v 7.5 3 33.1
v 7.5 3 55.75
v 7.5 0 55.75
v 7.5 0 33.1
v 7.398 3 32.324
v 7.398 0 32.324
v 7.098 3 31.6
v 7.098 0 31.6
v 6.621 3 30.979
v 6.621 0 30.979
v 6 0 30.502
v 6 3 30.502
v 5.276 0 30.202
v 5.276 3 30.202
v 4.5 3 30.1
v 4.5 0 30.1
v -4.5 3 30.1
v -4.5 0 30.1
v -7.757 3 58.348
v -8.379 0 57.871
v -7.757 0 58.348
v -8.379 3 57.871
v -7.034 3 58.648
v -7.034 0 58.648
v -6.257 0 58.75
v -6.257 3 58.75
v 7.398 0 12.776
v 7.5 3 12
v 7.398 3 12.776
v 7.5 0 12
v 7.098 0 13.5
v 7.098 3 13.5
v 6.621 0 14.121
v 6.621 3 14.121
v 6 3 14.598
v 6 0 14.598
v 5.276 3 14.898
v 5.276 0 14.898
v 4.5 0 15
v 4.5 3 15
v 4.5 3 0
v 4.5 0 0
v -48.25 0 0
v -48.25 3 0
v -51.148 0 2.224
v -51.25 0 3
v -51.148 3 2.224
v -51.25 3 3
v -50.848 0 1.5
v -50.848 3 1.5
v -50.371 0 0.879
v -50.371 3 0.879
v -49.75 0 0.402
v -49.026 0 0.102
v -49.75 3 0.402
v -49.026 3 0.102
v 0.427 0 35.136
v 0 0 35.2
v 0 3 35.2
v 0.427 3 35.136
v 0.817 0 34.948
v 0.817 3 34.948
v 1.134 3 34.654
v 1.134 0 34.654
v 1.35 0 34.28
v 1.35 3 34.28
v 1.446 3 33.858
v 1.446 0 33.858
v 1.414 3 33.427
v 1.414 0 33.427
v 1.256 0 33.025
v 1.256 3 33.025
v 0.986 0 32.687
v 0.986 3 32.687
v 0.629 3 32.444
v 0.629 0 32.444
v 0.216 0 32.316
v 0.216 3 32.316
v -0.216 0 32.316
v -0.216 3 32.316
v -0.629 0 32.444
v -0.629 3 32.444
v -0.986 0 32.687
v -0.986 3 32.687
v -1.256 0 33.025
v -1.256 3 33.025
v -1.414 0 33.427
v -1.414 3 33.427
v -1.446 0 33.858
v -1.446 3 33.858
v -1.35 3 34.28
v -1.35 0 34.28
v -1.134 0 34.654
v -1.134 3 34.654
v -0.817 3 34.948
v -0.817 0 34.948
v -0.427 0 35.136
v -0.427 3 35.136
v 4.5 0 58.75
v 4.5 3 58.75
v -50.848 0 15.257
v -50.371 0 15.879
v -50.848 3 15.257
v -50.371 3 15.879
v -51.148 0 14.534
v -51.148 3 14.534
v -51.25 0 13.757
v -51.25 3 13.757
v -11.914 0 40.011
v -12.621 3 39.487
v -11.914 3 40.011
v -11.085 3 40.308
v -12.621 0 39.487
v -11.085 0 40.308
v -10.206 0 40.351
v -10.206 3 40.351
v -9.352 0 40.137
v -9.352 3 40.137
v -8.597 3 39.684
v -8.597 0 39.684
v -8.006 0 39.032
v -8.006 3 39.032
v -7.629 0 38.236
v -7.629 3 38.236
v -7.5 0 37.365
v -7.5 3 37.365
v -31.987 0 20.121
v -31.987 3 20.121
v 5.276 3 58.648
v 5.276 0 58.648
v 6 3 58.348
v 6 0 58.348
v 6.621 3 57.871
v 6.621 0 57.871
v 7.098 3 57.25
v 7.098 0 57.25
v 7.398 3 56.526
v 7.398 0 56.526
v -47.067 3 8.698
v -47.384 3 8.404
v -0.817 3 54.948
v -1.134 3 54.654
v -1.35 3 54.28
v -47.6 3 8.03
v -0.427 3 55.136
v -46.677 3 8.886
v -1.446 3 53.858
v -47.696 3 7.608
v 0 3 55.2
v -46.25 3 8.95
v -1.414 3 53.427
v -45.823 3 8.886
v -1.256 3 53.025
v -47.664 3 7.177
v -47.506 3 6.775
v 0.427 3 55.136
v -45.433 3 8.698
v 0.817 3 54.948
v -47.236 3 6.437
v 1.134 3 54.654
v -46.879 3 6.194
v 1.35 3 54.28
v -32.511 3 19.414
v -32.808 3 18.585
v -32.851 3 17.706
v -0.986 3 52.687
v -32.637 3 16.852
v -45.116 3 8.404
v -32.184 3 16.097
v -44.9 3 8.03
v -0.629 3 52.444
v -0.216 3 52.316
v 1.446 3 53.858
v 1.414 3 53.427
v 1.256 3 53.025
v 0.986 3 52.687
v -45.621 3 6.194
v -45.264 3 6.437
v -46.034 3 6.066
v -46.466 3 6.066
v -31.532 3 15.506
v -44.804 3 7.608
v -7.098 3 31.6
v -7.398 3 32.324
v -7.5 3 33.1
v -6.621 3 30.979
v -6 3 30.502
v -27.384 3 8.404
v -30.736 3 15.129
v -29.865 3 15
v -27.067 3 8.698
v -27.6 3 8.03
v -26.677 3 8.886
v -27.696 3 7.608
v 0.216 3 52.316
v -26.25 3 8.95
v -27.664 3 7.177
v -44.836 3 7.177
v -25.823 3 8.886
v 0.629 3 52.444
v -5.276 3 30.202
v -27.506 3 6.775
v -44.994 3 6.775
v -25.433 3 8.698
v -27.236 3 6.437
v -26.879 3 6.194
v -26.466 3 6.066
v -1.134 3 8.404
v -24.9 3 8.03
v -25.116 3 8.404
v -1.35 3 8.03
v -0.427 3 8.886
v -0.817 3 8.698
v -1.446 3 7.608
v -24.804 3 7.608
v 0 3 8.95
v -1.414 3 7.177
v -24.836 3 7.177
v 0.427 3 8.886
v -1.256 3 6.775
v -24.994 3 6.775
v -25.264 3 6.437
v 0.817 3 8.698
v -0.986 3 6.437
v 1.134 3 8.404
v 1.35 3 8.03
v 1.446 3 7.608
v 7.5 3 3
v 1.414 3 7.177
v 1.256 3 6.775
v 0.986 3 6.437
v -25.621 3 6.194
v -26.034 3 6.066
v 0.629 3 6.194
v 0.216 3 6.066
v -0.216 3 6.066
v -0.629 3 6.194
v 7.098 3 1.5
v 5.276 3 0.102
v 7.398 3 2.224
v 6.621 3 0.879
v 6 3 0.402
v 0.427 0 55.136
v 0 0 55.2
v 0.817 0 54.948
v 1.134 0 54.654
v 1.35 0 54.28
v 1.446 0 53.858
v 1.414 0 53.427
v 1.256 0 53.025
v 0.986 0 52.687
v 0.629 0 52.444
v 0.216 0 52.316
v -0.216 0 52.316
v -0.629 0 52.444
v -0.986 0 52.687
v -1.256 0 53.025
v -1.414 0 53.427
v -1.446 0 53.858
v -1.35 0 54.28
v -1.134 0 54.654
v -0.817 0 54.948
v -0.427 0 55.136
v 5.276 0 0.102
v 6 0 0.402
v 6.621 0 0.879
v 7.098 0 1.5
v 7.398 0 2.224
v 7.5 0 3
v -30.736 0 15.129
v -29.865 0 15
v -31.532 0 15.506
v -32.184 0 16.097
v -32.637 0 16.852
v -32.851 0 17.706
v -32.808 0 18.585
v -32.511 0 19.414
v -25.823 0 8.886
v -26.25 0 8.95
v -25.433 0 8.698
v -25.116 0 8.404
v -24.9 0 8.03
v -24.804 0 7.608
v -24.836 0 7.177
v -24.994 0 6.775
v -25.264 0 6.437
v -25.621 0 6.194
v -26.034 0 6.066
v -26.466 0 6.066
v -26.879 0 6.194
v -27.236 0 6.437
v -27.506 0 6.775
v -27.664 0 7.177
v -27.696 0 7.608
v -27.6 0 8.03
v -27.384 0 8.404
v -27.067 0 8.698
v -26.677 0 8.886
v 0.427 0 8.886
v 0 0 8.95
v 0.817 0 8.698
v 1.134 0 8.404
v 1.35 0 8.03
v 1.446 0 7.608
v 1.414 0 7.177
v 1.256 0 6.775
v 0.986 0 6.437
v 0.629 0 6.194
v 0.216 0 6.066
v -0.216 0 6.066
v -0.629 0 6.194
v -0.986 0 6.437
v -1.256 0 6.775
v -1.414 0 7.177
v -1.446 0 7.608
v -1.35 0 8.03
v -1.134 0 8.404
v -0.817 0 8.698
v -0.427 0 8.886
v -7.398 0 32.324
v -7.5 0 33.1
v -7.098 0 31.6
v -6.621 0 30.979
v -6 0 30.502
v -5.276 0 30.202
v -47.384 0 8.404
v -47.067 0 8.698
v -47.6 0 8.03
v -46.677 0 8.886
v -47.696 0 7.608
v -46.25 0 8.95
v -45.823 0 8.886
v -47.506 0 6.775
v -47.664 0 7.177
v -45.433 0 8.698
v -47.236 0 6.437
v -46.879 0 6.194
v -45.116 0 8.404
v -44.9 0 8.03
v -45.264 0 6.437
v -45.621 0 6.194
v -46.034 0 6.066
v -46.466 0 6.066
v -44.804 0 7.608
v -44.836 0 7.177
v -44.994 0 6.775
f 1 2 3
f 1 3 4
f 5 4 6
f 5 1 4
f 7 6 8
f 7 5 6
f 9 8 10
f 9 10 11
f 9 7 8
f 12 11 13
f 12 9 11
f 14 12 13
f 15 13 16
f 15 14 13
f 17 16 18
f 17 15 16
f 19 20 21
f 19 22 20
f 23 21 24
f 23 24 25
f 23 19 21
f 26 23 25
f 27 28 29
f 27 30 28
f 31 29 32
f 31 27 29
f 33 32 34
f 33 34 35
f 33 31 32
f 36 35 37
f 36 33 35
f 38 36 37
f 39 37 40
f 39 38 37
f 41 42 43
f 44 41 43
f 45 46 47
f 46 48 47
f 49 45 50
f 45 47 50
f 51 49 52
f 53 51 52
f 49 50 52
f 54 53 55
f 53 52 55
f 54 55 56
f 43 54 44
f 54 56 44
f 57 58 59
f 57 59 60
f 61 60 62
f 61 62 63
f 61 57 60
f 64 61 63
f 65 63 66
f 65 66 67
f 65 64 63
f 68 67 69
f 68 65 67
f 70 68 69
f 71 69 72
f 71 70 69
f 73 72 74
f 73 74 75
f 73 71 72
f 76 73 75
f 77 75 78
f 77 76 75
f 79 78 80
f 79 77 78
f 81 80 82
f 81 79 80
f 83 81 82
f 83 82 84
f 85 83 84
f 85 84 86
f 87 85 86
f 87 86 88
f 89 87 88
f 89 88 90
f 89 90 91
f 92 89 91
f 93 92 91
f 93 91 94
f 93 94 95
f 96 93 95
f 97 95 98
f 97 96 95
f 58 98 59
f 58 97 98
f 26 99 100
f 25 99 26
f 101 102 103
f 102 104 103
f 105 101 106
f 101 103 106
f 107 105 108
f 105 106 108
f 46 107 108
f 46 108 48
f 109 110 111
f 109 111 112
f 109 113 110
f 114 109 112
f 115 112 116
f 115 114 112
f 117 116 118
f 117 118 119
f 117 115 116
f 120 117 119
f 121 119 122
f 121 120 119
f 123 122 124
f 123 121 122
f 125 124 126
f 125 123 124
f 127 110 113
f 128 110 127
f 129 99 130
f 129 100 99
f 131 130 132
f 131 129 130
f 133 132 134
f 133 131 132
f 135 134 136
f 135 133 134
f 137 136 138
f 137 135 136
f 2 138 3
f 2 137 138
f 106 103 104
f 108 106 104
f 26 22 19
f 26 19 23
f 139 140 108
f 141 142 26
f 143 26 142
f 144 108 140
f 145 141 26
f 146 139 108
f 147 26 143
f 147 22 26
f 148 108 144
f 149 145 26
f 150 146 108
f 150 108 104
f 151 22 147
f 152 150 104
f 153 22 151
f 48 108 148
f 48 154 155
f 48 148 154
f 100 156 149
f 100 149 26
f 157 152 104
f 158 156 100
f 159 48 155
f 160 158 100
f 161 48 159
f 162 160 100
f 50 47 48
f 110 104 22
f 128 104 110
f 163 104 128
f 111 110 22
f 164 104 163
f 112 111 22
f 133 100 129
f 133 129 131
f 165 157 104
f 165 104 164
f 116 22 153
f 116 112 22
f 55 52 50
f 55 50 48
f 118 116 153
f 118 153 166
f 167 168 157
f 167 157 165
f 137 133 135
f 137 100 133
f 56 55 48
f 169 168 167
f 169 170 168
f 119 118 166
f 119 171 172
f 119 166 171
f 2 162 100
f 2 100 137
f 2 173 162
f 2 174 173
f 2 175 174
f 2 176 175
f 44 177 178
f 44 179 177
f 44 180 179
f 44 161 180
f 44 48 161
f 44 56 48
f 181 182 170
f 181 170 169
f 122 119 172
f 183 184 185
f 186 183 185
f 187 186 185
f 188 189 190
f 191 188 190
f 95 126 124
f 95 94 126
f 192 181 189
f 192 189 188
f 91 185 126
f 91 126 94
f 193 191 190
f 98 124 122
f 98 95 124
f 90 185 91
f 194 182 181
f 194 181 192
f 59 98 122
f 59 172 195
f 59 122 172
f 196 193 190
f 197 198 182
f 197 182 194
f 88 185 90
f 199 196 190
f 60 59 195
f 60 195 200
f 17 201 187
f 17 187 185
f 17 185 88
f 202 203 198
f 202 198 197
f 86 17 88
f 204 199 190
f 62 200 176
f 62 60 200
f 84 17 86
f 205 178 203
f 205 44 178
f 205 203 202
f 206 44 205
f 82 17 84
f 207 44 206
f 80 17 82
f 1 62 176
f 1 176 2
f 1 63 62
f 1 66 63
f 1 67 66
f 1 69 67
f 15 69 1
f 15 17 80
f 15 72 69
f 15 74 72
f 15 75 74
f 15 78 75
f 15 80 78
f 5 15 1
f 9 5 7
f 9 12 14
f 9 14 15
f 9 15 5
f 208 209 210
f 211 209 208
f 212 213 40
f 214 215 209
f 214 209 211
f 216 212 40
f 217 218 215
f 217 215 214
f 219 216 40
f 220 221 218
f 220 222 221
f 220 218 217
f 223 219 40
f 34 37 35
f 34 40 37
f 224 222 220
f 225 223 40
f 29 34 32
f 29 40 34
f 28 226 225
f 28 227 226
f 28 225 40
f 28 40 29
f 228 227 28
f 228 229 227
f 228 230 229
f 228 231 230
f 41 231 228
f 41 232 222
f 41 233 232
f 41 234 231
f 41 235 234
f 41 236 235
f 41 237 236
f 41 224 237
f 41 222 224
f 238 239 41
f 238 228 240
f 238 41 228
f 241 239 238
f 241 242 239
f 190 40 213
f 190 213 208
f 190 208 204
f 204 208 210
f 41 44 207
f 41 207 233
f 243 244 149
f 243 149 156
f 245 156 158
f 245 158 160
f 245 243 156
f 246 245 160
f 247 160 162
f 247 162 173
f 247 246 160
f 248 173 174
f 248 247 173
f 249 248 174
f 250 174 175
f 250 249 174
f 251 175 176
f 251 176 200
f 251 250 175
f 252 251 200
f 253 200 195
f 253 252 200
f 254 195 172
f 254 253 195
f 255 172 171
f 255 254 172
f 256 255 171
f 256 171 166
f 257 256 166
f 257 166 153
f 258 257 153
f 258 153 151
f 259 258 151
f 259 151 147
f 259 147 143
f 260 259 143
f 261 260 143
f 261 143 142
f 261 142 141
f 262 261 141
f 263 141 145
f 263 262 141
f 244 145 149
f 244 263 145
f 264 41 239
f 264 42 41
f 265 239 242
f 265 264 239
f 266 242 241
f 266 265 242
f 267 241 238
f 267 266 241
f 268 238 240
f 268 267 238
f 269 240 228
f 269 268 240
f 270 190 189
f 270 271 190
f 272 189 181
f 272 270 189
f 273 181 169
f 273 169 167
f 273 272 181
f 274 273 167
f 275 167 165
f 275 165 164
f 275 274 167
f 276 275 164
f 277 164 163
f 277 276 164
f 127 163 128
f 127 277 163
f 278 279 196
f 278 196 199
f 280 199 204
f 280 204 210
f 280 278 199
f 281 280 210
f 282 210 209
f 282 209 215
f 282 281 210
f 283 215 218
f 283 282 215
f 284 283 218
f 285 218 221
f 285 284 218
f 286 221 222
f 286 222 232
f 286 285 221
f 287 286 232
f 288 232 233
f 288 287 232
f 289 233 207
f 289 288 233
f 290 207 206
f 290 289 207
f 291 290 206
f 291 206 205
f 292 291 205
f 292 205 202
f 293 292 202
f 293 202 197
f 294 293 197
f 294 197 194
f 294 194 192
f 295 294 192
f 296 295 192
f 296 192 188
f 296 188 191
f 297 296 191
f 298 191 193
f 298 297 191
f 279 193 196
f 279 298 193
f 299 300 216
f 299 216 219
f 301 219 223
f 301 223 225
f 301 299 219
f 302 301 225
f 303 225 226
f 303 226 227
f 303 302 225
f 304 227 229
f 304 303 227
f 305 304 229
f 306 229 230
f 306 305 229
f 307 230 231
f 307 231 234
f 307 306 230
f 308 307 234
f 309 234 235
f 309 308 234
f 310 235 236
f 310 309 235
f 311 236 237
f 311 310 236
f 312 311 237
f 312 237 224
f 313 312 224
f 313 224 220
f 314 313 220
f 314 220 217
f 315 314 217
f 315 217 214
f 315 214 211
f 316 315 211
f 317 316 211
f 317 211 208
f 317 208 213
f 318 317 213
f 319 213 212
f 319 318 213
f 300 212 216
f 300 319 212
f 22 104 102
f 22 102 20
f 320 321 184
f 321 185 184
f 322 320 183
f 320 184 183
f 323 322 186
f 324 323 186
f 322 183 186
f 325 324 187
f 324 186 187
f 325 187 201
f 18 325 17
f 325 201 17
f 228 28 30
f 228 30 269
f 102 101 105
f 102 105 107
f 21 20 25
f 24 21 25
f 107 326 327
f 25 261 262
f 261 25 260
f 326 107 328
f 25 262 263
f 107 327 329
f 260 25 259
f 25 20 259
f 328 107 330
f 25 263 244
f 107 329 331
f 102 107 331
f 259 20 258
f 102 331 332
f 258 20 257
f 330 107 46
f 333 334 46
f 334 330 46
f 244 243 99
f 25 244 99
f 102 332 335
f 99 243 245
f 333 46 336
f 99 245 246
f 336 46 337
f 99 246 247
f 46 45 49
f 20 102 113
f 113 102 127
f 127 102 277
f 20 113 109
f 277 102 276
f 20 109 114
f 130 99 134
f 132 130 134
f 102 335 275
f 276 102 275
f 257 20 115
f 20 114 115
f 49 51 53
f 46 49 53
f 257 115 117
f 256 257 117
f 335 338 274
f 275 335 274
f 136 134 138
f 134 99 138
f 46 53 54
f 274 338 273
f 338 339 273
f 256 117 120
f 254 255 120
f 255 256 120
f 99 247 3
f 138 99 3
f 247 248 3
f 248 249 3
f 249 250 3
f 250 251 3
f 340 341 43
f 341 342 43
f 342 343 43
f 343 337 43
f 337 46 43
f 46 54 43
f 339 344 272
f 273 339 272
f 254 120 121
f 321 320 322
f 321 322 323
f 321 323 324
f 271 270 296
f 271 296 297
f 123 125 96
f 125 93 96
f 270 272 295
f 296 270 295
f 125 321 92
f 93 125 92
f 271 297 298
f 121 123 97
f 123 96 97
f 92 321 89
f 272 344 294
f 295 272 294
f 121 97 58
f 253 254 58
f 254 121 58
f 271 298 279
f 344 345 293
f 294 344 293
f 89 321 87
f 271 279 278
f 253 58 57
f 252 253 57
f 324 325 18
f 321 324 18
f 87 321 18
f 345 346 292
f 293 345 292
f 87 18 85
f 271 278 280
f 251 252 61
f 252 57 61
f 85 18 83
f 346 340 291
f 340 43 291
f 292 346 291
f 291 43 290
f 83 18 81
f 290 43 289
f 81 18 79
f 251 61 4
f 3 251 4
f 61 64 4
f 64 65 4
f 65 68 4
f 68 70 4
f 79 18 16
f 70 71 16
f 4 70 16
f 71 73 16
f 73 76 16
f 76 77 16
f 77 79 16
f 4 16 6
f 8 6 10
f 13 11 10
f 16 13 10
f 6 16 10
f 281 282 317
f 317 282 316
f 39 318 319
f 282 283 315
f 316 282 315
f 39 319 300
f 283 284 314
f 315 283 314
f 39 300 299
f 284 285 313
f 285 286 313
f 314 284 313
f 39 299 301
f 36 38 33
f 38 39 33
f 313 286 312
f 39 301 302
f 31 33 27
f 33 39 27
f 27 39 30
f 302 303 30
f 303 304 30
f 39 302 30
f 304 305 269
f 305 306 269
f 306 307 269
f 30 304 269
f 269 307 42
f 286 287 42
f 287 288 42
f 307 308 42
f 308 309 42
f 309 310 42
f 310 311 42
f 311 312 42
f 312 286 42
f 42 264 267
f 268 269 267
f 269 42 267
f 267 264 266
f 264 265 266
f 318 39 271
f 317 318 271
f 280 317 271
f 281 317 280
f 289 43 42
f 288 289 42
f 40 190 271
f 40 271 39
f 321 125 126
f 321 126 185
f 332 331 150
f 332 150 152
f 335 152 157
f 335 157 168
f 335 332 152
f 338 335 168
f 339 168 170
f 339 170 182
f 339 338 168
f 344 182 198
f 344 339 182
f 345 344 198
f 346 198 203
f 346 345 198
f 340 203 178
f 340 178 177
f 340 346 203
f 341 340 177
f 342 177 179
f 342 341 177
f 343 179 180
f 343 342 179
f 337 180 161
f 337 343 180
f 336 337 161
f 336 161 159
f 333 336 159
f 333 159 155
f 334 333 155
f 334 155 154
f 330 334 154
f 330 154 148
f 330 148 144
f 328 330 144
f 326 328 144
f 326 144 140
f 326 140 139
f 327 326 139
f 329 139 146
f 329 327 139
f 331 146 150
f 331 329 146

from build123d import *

# Parameters (mm, degrees)
SKETCH_1_R          = 1.45
EXTRUDE_1_DEPTH     = 3
EXTRUDE_2_DEPTH     = 3
SKETCH_4_W          = 43.75
SKETCH_4_H          = 58.75
CUT_EXTRUDE_2_DEPTH = 79.02002948
SKETCH_5_W          = 15
SKETCH_5_H          = 15
CUT_EXTRUDE_3_DEPTH = 79.02002948
SKETCH_6_W          = 15
SKETCH_6_H          = 3
CUT_EXTRUDE_4_DEPTH = 0.1
FILLET_1_R          = 3


with BuildPart() as part:
    # 草图1 → 凸台-拉伸1 (new body)
    with BuildSketch(Plane(origin=(0, 0, 0), x_dir=(1, 0, 0), z_dir=(0, 1, 0))):
        Polygon((-51.25, 0), (0, 0), (51.25, 0), (51.25, -15), (7.5, -15), (7.5, -58.75), (-7.5, -58.75), (-7.5, -15), (-51.25, -15), align=None)
        with Locations(Location((0, -7.5, 0), (0, 0, 270))):
            Circle(SKETCH_1_R, mode=Mode.SUBTRACT)
        with Locations(Location((0, -33.75, 0), (0, 0, 270))):
            Circle(SKETCH_1_R, mode=Mode.SUBTRACT)
        with Locations(Location((0, -53.75, 0), (0, 0, 270))):
            Circle(SKETCH_1_R, mode=Mode.SUBTRACT)
        with Locations(Location((-26.25, -7.5, 0), (0, 0, 270))):
            Circle(SKETCH_1_R, mode=Mode.SUBTRACT)
        with Locations(Location((-46.25, -7.5, 0), (0, 0, 270))):
            Circle(SKETCH_1_R, mode=Mode.SUBTRACT)
        with Locations(Location((46.25, -7.5, 0), (0, 0, 90))):
            Circle(SKETCH_1_R, mode=Mode.SUBTRACT)
        with Locations(Location((26.25, -7.5, 0), (0, 0, 90))):
            Circle(SKETCH_1_R, mode=Mode.SUBTRACT)
    extrude(amount=EXTRUDE_1_DEPTH)

    # 草图2 → 凸台-拉伸2 (add)
    with BuildSketch(Plane(origin=(0, 3, 0), x_dir=(1, 0, 0), z_dir=(0, 1, 0))):
        Polygon((-51.25, -15), (-7.5, -58.75), (-7.5, -44.607864376), (-37.107864376, -15), align=None)
        Polygon((37.107864376, -15), (51.25, -15), (7.5, -58.75), (7.5, -44.607864376), align=None)
    extrude(amount=-EXTRUDE_2_DEPTH)

    # 草图4 → 切除-拉伸2 (cut, through all)
    with BuildSketch(Plane(origin=(0, 3, 0), x_dir=(1, 0, 0), z_dir=(0, 1, 0))):
        with Locations((29.375, -29.375)):
            Rectangle(SKETCH_4_W, SKETCH_4_H)
    extrude(amount=-CUT_EXTRUDE_2_DEPTH, mode=Mode.SUBTRACT)

    # 草图5 → 切除-拉伸3 (cut, through all)
    with BuildSketch(Plane(origin=(0, 3, 0), x_dir=(1, 0, 0), z_dir=(0, 1, 0))):
        with Locations((0, -22.5)):
            Rectangle(SKETCH_5_W, SKETCH_5_H)
    extrude(amount=-CUT_EXTRUDE_3_DEPTH, mode=Mode.SUBTRACT)

    # 草图6 → 切除-拉伸4 (cut)
    with BuildSketch(Plane(origin=(0, 0, 30), x_dir=(-1, 0, 0), z_dir=(0, 0, -1))):
        with Locations((0, 1.5)):
            Rectangle(SKETCH_6_W, SKETCH_6_H)
    extrude(amount=-CUT_EXTRUDE_4_DEPTH, mode=Mode.SUBTRACT)

    # 圆角1
    fillet_1_edges = [part.edges().sort_by_distance(p)[0] for p in [
        (7.5, 1.5, 15),
        (-7.5, 1.5, 30.1),
        (7.5, 1.5, 30.1),
        (-51.25, 1.5, 0),
        (7.5, 1.5, 58.75),
        (-7.5, 1.5, 58.75),
        (-51.25, 1.5, 15),
        (-7.5, 1.5, 44.607864376),
        (-37.107864376, 1.5, 15),
        (7.5, 1.5, 0),
    ]]
    fillet(fillet_1_edges, radius=FILLET_1_R)


solid = part.part
